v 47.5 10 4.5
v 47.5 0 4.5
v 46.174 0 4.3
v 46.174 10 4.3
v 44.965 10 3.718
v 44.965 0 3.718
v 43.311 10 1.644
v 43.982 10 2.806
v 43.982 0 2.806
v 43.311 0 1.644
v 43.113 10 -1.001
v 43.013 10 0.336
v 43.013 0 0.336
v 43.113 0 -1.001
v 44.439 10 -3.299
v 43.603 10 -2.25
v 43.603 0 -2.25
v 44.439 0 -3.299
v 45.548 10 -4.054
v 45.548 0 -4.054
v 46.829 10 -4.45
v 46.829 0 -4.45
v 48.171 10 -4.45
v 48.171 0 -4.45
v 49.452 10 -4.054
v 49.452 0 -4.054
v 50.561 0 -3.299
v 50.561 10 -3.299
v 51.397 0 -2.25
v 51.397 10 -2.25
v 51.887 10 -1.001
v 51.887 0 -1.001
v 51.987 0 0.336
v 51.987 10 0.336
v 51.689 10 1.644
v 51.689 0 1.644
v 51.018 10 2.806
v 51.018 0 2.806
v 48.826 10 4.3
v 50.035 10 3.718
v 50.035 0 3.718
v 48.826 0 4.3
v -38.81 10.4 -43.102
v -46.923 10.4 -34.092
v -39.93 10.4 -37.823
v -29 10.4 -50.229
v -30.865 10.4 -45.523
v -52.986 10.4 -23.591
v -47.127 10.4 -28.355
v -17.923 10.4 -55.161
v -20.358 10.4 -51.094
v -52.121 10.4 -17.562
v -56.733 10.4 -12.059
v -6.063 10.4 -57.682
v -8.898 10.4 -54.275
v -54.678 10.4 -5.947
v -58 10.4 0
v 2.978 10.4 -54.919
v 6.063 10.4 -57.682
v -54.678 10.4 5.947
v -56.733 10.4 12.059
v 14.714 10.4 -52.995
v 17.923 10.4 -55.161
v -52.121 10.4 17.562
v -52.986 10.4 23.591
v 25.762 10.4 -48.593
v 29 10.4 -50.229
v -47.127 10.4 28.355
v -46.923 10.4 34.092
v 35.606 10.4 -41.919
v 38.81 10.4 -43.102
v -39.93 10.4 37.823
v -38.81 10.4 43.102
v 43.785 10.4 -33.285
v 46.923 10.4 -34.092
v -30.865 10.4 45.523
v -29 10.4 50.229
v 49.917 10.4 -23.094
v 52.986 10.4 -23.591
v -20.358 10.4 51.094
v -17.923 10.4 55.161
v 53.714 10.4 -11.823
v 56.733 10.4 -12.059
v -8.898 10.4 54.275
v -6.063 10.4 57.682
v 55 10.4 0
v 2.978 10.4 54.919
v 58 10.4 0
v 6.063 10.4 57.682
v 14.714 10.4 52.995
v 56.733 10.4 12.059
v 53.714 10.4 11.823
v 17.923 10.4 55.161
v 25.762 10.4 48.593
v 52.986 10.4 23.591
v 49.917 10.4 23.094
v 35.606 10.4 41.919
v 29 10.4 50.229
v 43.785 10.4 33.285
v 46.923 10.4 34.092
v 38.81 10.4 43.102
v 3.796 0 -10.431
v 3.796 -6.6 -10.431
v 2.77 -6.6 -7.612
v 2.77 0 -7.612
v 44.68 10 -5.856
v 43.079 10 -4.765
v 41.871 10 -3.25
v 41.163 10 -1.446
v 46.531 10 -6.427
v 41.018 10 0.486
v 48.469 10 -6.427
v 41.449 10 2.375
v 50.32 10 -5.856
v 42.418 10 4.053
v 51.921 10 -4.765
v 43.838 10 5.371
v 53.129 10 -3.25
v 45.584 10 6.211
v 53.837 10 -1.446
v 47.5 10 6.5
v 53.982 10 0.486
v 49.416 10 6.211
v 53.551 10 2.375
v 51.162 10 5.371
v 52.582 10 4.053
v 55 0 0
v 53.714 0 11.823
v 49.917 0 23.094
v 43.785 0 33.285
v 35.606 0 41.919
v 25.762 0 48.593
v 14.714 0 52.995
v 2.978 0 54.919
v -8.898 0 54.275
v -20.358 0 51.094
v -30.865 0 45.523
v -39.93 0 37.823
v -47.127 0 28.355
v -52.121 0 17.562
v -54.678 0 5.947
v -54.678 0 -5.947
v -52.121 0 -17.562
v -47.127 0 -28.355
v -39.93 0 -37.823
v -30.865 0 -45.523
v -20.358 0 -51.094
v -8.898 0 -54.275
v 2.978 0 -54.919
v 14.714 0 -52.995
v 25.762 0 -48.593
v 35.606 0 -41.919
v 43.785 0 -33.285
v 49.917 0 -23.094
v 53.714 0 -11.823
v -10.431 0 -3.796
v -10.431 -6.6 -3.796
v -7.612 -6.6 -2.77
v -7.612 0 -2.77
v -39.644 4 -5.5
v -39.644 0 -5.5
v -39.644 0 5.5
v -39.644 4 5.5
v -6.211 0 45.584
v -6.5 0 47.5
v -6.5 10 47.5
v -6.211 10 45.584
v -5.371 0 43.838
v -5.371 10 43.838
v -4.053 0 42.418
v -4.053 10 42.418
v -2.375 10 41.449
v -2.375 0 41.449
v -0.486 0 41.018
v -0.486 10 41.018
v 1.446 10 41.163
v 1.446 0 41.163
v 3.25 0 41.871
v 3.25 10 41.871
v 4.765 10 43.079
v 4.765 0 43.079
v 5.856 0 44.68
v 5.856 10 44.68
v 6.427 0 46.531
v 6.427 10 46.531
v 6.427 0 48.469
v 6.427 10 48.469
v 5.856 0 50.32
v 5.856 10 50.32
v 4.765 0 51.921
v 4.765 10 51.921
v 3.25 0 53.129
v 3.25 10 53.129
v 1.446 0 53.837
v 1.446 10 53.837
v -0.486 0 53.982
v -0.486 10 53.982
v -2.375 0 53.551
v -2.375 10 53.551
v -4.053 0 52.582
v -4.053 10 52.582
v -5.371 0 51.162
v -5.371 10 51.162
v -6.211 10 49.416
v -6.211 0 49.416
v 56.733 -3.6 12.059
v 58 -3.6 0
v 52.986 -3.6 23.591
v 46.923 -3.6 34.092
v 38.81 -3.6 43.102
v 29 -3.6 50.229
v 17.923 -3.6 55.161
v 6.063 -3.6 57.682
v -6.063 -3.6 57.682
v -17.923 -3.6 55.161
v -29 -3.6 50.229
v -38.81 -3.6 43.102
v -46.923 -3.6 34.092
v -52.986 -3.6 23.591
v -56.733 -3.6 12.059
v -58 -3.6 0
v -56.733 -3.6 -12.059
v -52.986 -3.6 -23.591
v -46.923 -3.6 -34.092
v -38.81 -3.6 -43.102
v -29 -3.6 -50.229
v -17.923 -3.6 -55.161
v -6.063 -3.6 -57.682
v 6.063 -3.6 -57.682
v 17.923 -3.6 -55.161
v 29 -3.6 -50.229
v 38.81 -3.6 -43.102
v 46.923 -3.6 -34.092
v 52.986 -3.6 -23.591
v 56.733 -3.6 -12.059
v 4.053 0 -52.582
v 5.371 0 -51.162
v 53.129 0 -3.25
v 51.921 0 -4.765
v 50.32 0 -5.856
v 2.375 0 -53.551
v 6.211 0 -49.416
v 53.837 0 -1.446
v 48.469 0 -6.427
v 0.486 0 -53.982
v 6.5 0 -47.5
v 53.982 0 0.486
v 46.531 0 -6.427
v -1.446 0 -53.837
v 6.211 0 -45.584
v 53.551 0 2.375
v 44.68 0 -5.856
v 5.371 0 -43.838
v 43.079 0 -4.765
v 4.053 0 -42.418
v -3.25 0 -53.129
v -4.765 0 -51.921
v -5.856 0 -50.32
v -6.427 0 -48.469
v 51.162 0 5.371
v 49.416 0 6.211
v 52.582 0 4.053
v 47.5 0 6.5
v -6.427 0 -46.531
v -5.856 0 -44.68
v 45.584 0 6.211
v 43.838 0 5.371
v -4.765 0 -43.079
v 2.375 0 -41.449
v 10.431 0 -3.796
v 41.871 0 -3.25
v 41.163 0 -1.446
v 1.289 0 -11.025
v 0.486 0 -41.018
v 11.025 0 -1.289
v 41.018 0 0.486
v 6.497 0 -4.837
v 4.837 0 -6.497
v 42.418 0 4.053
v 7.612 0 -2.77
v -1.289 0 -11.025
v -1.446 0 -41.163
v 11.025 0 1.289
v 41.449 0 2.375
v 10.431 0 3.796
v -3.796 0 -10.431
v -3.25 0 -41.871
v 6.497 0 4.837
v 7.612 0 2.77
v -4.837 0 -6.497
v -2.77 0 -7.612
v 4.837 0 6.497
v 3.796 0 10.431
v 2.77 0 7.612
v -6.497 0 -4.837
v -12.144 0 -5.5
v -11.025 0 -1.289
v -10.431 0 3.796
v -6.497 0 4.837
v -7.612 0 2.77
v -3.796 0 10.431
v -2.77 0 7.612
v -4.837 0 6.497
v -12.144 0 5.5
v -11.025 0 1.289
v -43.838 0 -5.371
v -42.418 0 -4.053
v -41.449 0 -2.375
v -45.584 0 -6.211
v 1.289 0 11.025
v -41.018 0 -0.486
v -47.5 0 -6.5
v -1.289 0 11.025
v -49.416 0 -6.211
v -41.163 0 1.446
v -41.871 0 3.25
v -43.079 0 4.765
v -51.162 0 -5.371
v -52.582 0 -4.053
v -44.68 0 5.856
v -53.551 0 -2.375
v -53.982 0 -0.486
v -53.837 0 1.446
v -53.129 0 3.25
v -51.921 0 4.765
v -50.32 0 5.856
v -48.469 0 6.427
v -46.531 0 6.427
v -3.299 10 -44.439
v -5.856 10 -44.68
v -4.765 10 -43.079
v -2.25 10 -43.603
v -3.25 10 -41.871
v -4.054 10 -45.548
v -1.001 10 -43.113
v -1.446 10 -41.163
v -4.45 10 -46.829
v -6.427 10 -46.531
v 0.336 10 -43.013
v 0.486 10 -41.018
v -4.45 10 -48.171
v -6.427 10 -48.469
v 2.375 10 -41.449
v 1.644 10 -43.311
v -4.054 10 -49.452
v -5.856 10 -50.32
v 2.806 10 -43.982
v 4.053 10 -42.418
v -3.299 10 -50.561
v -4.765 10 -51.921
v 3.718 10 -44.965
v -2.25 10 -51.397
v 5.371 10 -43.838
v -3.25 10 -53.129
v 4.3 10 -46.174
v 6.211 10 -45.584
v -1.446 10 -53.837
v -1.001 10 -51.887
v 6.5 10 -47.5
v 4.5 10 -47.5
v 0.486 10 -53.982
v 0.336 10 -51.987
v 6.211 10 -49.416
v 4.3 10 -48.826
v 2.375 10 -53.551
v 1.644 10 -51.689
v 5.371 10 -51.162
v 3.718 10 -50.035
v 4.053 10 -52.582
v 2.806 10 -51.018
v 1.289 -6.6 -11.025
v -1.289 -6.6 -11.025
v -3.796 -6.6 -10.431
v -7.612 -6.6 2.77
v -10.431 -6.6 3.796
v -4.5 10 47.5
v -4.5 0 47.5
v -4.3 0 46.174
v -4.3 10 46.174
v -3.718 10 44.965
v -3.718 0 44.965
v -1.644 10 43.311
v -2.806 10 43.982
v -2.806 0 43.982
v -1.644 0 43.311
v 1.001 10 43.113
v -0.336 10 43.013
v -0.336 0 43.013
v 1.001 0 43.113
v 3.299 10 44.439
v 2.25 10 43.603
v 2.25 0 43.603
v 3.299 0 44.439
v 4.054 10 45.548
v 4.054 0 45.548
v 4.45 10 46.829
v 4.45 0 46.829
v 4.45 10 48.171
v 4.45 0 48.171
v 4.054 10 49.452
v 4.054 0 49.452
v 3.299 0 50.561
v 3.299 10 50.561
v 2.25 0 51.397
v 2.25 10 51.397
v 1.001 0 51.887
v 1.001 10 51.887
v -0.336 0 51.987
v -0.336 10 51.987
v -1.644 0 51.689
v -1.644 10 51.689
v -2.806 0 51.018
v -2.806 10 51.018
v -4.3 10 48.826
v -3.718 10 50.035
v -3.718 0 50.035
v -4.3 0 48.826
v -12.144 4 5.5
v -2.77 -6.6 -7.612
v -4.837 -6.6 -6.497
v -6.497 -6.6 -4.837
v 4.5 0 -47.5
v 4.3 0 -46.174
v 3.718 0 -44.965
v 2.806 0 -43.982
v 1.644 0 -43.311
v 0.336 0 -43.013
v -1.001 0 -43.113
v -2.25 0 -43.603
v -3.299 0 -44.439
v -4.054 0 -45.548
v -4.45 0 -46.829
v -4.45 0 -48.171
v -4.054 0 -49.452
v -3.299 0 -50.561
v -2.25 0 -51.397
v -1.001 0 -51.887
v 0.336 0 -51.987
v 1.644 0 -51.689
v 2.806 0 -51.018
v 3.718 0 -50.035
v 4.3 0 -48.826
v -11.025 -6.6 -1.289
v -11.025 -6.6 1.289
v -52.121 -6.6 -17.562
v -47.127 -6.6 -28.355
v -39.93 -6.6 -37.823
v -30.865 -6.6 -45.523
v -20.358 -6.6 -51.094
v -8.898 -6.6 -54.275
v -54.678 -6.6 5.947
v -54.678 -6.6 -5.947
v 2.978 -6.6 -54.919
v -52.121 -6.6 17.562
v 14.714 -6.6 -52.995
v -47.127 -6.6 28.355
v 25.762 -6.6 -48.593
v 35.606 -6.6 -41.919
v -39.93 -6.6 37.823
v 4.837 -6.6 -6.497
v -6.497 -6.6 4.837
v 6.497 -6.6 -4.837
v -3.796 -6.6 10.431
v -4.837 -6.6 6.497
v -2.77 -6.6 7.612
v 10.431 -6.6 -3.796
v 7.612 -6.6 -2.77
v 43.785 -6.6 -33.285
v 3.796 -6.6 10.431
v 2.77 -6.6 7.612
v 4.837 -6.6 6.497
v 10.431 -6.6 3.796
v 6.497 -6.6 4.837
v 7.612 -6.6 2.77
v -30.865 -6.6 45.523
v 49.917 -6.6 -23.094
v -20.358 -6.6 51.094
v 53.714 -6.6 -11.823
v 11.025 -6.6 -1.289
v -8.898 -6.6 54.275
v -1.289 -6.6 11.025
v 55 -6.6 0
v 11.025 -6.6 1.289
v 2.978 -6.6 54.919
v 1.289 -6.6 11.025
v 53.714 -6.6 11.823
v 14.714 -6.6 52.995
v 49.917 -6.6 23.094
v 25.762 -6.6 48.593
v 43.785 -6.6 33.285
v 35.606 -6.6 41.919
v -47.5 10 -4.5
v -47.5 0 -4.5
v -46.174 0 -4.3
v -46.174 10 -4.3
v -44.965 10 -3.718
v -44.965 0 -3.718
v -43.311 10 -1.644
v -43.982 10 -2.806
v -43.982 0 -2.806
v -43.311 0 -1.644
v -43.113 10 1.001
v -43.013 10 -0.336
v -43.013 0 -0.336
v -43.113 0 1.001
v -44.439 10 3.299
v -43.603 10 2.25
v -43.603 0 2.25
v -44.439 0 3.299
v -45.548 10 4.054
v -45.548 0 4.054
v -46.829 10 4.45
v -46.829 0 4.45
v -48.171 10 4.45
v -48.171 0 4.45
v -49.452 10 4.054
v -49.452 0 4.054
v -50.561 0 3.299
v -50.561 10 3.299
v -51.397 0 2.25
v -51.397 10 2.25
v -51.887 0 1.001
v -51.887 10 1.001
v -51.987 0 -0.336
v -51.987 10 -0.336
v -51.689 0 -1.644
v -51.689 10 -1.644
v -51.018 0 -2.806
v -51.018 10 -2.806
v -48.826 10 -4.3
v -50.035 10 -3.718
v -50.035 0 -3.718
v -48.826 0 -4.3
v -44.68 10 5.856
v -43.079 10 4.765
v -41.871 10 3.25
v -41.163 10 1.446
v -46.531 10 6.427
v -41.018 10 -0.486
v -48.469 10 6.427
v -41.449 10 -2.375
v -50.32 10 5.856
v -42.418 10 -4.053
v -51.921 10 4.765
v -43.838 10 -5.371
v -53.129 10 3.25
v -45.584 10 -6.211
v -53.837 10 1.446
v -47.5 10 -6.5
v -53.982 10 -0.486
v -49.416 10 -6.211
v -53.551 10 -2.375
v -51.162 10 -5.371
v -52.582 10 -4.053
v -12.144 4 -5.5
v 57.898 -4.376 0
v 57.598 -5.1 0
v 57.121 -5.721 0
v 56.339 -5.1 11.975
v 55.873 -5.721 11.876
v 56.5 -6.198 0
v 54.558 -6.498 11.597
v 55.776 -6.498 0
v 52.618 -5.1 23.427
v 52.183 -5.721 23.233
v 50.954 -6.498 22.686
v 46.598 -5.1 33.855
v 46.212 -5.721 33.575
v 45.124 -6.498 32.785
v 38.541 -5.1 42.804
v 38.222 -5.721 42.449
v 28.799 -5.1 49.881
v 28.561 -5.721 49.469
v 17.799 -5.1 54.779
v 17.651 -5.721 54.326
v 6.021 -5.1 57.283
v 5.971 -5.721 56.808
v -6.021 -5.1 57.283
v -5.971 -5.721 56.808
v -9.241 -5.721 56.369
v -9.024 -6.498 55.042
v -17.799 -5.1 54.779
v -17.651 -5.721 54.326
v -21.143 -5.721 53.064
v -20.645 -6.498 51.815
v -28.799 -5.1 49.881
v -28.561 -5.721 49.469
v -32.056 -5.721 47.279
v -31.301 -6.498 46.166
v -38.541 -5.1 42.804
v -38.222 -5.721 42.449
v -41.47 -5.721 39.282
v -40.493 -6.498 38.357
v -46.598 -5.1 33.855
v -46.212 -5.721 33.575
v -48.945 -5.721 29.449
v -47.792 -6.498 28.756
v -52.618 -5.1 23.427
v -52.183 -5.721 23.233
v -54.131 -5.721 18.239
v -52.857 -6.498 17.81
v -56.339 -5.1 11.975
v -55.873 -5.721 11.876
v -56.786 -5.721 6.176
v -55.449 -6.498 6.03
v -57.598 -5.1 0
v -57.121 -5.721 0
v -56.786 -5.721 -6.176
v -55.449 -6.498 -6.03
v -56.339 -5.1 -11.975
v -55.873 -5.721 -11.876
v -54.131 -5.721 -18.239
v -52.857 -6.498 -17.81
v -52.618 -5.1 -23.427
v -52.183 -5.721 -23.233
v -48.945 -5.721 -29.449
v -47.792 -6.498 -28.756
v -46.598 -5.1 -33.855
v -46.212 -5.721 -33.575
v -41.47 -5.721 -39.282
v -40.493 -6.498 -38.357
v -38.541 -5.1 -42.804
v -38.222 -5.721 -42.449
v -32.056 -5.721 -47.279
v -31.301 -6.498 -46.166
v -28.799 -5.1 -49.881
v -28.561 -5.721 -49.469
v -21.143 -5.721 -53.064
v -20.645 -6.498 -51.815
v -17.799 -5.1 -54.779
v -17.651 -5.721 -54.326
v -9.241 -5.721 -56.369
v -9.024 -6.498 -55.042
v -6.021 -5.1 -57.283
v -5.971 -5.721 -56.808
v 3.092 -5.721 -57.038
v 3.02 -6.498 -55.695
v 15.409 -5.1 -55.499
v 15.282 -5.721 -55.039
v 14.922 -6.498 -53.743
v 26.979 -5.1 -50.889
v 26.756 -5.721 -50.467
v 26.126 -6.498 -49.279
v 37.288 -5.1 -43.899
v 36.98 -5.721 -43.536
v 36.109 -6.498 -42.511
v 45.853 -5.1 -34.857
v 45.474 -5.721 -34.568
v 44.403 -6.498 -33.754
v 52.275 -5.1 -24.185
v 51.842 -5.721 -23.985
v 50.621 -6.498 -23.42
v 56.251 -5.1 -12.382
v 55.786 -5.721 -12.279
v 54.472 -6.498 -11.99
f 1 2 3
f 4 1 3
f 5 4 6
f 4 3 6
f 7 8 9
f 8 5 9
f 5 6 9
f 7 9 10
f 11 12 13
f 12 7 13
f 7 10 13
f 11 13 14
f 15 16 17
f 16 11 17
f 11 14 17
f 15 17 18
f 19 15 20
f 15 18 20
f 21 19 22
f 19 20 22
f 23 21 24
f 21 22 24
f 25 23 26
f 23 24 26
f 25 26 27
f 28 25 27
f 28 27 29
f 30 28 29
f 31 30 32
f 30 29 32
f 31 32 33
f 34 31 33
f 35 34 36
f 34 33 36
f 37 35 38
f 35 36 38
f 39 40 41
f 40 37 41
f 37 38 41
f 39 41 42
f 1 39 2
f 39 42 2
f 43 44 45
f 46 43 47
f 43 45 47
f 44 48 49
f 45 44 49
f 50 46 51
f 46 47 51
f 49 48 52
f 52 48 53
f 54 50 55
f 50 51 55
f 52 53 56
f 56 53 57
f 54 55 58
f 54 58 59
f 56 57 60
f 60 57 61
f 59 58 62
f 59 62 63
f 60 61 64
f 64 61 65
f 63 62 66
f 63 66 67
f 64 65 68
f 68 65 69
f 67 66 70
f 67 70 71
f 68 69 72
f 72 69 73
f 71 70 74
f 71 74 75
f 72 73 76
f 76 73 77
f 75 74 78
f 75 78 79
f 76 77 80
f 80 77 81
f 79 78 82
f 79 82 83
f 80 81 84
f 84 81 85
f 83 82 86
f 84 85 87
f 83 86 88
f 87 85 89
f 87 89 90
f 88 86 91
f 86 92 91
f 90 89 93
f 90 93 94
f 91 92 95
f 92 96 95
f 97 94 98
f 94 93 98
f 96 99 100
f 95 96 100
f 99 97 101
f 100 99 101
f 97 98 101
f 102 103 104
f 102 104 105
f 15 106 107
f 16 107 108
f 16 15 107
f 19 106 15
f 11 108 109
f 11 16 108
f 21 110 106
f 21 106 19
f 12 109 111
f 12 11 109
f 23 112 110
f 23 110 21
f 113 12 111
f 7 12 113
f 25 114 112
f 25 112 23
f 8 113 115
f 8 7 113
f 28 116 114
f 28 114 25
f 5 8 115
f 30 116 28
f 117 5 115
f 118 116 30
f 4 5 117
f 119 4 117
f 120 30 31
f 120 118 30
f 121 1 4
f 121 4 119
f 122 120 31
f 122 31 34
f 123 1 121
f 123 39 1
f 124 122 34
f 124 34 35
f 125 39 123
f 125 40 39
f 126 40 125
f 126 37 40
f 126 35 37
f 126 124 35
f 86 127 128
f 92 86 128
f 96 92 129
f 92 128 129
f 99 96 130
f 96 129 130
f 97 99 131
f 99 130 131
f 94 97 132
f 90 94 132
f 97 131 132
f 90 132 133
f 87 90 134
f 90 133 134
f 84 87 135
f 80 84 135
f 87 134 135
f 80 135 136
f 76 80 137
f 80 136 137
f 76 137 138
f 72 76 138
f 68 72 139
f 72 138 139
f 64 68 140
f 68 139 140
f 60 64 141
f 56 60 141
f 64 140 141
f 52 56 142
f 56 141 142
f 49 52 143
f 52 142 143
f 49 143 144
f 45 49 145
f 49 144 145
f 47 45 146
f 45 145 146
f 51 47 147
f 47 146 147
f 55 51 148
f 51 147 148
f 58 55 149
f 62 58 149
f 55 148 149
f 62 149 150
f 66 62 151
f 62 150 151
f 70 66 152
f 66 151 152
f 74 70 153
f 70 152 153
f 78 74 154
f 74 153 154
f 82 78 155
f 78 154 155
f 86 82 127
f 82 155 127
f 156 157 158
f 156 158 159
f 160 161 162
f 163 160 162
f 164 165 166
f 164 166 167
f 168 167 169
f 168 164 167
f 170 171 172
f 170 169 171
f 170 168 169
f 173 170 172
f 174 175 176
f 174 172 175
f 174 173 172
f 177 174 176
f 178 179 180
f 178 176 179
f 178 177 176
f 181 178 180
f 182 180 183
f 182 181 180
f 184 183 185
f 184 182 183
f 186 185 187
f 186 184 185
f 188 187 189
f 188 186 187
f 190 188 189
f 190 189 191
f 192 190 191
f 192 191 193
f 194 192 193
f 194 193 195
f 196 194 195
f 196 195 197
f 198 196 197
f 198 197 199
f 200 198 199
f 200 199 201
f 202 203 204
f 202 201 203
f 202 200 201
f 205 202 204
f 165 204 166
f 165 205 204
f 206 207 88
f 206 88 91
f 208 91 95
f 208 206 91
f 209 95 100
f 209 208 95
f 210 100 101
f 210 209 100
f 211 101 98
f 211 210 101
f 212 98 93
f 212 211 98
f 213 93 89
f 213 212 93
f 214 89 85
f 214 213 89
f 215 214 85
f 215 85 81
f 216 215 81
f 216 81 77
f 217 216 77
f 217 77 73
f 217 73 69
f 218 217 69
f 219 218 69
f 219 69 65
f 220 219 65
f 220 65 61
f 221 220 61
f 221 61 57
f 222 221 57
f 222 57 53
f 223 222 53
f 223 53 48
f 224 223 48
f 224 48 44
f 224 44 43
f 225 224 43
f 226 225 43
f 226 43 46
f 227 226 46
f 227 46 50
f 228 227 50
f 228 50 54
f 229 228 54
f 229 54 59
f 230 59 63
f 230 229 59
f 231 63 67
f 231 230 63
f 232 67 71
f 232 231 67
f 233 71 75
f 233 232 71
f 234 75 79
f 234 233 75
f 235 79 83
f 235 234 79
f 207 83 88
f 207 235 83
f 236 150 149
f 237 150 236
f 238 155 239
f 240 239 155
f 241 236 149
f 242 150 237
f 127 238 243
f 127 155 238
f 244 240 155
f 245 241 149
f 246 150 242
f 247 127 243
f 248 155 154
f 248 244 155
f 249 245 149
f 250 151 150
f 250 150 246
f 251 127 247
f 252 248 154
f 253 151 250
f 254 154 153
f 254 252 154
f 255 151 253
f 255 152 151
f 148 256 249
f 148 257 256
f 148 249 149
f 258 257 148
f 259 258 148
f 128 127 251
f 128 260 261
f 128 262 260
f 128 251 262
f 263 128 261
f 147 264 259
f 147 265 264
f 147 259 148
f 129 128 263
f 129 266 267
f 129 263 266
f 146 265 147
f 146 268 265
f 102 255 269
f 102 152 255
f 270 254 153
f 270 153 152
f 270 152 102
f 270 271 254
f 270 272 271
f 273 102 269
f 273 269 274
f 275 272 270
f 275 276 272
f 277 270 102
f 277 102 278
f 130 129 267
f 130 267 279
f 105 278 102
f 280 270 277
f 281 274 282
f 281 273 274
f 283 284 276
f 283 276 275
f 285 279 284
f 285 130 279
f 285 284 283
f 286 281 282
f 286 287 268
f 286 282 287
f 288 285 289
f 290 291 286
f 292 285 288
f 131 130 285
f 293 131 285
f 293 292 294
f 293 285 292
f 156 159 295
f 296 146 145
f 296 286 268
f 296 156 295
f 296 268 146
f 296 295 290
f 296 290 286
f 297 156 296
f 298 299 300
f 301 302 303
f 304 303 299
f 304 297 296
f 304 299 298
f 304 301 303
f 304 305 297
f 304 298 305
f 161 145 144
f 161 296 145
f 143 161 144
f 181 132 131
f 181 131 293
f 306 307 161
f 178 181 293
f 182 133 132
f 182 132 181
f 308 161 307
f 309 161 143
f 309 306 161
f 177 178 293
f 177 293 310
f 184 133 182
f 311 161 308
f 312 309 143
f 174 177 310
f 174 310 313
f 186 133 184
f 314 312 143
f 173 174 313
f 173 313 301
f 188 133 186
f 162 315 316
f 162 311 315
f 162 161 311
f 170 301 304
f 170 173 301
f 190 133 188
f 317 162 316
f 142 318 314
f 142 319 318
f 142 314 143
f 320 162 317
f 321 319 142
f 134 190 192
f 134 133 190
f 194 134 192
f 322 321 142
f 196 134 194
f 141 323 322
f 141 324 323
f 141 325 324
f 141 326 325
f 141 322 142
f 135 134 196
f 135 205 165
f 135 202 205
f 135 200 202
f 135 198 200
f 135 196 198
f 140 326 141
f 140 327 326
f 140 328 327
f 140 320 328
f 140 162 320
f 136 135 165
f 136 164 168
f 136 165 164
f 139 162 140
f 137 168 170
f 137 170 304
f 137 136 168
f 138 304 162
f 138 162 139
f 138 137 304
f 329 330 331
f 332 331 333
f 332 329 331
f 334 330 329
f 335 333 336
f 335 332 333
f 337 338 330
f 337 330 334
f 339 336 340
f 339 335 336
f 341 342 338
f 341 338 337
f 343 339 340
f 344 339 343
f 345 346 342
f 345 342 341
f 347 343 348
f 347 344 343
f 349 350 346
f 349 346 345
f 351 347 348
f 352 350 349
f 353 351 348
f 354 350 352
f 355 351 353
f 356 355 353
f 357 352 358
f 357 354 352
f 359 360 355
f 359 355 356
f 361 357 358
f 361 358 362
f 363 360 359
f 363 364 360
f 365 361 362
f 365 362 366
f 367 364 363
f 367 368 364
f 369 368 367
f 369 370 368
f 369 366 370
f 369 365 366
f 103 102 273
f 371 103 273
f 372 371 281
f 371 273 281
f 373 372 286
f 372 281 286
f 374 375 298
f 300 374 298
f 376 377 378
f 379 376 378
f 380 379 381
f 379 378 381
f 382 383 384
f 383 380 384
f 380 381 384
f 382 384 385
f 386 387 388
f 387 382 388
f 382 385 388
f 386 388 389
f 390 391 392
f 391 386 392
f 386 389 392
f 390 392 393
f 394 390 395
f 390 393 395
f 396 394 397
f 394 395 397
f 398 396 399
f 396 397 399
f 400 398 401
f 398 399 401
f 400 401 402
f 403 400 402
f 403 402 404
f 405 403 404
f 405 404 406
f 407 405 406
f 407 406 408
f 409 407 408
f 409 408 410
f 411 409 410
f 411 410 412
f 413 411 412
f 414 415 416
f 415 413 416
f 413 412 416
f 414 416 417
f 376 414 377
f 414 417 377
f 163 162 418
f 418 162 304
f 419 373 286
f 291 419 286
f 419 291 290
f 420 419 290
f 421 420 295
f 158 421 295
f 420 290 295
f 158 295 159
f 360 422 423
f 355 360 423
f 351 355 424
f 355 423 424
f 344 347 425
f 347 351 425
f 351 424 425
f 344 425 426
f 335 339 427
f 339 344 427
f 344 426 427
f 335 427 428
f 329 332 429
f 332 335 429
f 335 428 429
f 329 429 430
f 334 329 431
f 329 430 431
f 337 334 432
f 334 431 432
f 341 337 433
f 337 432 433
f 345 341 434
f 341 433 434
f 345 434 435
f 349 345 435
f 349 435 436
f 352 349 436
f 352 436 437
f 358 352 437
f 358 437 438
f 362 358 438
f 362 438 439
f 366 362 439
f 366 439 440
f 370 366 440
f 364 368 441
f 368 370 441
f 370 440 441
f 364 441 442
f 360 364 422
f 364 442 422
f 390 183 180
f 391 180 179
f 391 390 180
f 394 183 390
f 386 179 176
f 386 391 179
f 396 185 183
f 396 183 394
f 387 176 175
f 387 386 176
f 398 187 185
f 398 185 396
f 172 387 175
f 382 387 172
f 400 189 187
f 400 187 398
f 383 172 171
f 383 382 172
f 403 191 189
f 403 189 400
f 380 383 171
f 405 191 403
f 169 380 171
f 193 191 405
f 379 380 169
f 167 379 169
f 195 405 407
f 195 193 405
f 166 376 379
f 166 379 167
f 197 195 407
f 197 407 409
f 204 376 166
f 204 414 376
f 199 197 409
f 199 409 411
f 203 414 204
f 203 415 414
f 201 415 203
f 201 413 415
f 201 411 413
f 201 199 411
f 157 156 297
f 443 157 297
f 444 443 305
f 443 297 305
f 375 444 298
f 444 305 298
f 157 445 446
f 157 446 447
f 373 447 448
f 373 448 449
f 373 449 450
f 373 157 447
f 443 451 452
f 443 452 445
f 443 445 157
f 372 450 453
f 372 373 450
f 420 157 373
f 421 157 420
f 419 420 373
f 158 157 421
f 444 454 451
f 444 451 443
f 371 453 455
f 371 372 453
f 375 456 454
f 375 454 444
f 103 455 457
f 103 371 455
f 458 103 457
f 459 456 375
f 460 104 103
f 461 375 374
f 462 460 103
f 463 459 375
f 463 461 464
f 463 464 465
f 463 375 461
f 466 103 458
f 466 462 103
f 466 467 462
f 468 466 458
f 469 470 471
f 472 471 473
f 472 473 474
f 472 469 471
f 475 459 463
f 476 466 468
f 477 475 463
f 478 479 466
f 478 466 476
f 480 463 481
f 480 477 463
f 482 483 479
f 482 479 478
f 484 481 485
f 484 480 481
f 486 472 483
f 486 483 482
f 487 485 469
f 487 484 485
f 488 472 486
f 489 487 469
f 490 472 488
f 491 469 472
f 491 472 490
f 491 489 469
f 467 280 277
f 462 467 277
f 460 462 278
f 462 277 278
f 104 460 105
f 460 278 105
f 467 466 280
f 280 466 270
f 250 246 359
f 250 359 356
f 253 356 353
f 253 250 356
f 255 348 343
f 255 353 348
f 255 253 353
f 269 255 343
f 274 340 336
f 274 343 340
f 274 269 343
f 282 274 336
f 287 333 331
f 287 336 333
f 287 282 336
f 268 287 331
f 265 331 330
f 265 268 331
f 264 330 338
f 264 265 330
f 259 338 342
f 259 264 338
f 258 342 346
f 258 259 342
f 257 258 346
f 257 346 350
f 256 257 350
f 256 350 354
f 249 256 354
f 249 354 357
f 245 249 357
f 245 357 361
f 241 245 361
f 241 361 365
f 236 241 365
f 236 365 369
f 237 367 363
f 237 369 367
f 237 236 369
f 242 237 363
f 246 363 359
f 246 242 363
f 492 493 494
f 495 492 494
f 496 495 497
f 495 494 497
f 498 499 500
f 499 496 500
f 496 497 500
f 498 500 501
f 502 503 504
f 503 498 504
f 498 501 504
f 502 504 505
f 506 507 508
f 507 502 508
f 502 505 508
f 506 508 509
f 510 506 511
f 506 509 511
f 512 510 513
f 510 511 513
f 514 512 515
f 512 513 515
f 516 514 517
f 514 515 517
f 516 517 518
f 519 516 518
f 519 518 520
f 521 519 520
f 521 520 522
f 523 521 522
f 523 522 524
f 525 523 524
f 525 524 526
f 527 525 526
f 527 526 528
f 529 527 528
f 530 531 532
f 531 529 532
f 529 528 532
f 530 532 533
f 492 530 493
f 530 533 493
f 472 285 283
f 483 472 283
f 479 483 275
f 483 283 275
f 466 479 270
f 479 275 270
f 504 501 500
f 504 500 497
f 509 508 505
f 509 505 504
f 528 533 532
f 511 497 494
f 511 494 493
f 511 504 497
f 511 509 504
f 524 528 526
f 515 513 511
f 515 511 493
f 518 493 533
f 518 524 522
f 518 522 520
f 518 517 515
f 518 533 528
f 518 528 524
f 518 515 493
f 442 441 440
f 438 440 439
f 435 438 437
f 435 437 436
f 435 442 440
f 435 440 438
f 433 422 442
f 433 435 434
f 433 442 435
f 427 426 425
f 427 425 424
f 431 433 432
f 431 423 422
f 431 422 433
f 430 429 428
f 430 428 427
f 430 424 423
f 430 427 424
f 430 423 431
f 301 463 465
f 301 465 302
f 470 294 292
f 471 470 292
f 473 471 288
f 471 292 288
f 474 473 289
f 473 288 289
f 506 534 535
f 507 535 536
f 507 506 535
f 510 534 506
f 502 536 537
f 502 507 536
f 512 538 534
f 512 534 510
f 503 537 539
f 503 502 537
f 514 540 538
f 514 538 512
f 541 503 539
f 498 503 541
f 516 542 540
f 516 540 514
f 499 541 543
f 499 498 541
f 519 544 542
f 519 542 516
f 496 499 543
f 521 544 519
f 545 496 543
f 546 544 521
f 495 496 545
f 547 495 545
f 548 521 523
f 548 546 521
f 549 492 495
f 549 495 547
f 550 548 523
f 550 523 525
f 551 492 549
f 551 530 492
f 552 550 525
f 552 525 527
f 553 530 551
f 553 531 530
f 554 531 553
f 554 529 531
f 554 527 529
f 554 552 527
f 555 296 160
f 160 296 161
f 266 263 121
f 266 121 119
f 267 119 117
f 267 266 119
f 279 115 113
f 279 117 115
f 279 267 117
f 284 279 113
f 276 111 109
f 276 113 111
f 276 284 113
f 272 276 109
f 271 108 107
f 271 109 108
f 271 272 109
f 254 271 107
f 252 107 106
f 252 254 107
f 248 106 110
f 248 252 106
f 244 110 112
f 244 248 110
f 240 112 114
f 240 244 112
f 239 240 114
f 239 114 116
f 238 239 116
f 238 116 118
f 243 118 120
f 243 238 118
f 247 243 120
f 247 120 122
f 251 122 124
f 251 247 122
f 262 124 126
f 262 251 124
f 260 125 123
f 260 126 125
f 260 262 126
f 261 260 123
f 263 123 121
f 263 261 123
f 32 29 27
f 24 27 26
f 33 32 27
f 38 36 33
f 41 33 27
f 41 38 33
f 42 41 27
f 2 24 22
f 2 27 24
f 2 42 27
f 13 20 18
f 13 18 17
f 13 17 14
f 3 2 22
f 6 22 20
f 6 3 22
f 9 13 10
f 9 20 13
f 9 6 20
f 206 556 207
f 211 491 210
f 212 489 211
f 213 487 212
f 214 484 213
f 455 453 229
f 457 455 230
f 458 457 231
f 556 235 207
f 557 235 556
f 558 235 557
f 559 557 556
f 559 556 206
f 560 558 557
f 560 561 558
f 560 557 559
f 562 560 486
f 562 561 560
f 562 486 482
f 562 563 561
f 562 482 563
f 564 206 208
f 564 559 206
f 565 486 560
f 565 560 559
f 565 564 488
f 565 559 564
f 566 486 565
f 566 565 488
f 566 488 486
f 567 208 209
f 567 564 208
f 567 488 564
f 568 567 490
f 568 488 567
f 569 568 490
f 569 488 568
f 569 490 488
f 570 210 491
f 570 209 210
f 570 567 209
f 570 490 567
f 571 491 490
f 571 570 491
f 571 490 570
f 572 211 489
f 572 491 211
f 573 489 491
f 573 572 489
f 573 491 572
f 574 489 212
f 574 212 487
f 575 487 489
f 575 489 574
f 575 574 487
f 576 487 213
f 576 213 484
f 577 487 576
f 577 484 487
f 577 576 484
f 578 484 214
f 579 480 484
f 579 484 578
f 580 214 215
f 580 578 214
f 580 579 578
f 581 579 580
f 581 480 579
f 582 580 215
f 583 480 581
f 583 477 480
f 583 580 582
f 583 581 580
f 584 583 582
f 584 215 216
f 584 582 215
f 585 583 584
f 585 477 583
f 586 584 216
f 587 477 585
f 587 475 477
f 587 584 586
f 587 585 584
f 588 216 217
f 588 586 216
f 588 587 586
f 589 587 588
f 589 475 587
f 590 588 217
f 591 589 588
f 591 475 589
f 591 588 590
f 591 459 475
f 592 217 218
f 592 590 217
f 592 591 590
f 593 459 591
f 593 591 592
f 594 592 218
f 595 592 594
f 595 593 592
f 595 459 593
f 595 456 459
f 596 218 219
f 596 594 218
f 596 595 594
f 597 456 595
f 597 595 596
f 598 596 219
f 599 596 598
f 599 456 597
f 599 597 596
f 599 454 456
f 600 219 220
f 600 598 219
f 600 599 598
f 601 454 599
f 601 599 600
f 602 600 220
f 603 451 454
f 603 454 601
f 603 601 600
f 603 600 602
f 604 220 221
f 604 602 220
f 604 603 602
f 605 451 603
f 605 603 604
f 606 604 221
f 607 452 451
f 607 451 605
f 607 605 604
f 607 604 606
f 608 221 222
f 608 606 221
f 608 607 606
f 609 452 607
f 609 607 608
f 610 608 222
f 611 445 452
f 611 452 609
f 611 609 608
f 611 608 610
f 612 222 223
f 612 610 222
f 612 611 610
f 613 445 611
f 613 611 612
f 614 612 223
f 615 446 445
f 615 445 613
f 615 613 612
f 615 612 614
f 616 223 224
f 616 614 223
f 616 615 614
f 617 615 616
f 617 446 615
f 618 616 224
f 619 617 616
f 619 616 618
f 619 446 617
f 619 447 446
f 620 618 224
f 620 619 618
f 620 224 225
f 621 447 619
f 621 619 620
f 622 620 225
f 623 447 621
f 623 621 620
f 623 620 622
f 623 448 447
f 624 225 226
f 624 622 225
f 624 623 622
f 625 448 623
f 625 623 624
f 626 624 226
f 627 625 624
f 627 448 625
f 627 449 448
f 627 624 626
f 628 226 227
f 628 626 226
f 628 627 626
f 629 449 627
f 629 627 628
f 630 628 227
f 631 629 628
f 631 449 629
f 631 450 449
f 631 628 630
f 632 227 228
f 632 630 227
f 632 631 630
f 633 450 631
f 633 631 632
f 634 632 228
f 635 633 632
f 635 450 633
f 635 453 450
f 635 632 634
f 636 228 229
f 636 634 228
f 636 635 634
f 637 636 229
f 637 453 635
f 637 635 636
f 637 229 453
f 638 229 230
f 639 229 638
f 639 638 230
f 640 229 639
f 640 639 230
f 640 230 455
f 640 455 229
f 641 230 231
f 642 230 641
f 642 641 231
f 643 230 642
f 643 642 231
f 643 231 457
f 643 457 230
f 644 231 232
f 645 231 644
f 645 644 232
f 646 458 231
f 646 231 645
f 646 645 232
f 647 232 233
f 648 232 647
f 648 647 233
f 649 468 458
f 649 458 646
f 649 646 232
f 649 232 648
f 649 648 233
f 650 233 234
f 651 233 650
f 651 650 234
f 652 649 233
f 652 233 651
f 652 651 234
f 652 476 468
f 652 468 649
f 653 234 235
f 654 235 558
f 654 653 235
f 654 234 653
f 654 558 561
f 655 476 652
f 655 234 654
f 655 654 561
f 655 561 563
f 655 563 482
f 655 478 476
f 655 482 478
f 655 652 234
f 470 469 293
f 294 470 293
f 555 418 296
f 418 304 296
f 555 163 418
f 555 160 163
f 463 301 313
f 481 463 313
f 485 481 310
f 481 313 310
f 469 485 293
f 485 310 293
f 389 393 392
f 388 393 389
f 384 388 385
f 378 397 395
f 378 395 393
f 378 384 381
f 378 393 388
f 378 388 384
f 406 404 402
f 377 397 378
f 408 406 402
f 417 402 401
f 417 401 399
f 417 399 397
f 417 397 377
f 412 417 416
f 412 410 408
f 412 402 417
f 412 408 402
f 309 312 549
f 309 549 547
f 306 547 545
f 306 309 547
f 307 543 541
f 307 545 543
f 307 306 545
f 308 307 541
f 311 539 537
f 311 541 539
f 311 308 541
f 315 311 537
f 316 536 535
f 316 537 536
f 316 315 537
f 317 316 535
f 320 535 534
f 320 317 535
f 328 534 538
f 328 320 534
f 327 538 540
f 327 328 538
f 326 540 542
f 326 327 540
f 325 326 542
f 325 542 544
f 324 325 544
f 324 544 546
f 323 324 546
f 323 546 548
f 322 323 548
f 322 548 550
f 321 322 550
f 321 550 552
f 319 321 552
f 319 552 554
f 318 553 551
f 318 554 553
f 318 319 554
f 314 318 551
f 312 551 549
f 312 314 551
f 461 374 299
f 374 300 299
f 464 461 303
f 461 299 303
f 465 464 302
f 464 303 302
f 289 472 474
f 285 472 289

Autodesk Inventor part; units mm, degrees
ref_plane "YZ Plane" through (0, 0, 0) normal (1, 0, 0) x (0, 1, 0)
ref_plane "XZ Plane" through (0, 0, 0) normal (0, 1, 0) x (-1, 0, 0)
ref_plane "XY Plane" through (0, 0, 0) normal (0, 0, 1) x (1, 0, 0)
sketch "Sketch1" plane through (0, 0, 0) normal (0, 1, 0) x (-1, 0, 0)
  circle A0 centre (0, 0) radius 55
  dimension "d4" = 110
sketch "Sketch2" plane through (0, 0, 0) normal (0, 1, 0) x (-1, 0, 0)
  circle A0 centre (0, 0) radius 40 construction
  circle A1 centre (0, 0) radius 47.5 construction
  circle A2 centre (0, 47.5) radius 4.5
  circle A3 centre (0, 47.5) radius 6.5
  dimension "d11" = 95
  dimension "d10" = 80
  dimension "d12" = 9
  dimension "d13" = 13
extrude "Extrusion1" add sketch "Sketch1" against normal blind 6.6
extrude "Extrusion2" add sketch "Sketch2" along normal blind 10
pattern_circular "Circular Pattern1" count 4 over 360 about axis through (0, -10, 0) along (0, 1, 0) of "Extrusion2"
sketch "Sketch3" plane through (0, -6.6, 0) normal (0, -1, 0) x (1, 0, 0)
  circle A0 centre (0, 0) radius 55
  circle A1 centre (0, 0) radius 55 projected
  circle A2 centre (0, 0) radius 58
  dimension "d21" = 116
extrude "Extrusion3" add sketch "Sketch3" against normal blind 17
sketch "Sketch4" plane through (0, 0, 0) normal (0, 1, 0) x (1, 0, 0)
  circle A0 centre (0, 0) radius 8.1
  dimension "d24" = 16.2
extrude "Extrusion4" cut sketch "Sketch4" against normal blind 30
sketch "Sketch6" plane through (0, 0, 0) normal (1, 0, 0) x (0, 1, 0)
  line L0 (0, 8.1) -> (0, -8.1) projected
  line L1 (-6.6, -58) -> (-6.6, 58) projected
  line L2 (0, 8.1) -> (-6.6, 8.1)
  line L3 (-6.6, 8.1) -> (-6.6, 11.1)
  line L4 (-6.6, 11.1) -> (0, 11.1)
  line L5 (0, 11.1) -> (0, 8.1)
  line L6 (-8.4, 0) -> (1.4, 0) projected
  point P0 (0, 0)
  dimension "d27" = 3
revolve "Revolution1" cut sketch "Sketch6" angle 40 mid plane about axis through (0, -10, 0) along (0, 1, 0) contours L2 L1 L4 L5
pattern_circular "Circular Pattern2" count 4 over 360 about axis through (0, -10, 0) along (0, 1, 0) of "Revolution1"
fillet "Fillet1" radius 3 1 edges at (-58, -6.6, 0)
sketch "Sketch7" plane through (0, 0, 0) normal (0, 1, 0) x (1, 0, 0)
  circle A0 centre (0, 0) radius 12.5 construction
  line L0 (-12.144, 5.5) -> (-39.644, 5.5)
  line L1 (-39.644, 5.5) -> (-39.644, -5.5)
  line L2 (-39.644, -5.5) -> (-12.144, -5.5)
  line L3 (-12.144, -5.5) -> (-12.144, 5.5)
  dimension "d33" = 25
  dimension "d34" = 27.5
  dimension "d35" = 11
  dimension "d36" = 5.5
extrude "Extrusion5" add sketch "Sketch7" along normal blind 4
properties part number "BaseHumedadDireccion"
